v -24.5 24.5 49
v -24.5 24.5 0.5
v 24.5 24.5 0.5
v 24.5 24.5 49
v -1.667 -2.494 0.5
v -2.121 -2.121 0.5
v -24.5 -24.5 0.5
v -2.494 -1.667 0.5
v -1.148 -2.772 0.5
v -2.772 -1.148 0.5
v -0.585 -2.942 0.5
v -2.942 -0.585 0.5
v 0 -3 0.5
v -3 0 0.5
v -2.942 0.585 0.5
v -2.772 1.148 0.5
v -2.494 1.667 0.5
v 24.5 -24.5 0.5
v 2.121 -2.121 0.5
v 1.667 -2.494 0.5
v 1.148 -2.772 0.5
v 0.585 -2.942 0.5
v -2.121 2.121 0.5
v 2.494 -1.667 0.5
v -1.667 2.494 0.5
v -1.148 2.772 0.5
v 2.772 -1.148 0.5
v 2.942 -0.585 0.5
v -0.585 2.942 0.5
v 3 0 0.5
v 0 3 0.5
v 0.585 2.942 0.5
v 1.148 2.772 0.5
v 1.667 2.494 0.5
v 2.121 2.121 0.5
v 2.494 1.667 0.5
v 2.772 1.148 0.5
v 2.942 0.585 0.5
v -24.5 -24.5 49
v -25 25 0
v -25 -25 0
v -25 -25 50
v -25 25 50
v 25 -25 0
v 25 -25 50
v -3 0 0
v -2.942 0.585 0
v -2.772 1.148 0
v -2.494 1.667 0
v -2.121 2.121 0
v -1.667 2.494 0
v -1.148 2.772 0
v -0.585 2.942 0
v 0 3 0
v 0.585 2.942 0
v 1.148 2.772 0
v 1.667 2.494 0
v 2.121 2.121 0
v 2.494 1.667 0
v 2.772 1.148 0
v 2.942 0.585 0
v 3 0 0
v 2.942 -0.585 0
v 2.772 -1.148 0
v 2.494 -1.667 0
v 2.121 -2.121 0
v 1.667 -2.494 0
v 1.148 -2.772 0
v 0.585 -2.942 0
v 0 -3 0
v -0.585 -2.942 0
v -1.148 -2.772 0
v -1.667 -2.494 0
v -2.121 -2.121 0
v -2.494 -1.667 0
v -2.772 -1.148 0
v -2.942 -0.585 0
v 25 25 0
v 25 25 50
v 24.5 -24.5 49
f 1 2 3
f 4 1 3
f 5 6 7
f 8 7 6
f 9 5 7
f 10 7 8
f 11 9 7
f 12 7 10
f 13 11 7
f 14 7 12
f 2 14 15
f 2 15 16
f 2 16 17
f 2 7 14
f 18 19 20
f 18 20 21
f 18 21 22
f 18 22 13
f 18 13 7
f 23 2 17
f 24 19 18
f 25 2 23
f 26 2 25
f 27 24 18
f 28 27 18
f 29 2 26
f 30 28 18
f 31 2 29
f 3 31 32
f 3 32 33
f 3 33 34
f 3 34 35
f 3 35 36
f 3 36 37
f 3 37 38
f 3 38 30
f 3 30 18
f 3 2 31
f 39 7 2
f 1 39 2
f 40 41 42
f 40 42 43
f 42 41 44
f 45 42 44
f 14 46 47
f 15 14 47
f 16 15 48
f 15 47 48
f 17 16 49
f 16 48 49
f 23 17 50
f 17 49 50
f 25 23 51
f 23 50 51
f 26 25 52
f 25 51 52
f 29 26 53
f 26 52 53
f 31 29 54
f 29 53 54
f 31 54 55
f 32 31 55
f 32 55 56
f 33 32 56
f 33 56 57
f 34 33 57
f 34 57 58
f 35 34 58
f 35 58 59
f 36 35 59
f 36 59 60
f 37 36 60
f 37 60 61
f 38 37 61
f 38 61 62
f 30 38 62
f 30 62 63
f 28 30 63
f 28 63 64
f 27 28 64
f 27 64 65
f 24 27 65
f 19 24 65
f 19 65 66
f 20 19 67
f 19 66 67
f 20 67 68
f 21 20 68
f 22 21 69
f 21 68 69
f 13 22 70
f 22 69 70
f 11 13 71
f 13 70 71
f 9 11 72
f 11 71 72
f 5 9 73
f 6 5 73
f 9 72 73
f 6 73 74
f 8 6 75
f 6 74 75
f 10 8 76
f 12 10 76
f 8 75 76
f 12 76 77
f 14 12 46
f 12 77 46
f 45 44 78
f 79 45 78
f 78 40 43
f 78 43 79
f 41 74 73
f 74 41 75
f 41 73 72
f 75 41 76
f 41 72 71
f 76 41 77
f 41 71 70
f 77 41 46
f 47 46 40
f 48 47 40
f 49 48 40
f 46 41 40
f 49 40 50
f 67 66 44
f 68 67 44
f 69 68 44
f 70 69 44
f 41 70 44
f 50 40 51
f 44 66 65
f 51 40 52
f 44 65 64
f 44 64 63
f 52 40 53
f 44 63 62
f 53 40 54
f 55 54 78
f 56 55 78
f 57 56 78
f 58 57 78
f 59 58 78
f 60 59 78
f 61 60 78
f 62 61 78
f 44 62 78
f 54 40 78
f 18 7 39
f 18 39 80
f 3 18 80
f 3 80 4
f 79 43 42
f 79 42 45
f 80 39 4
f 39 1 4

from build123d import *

# Parameters (mm, degrees)
ESQUISSE1_W             = 50
ESQUISSE1_H             = 50
BOSS_EXTRU_1_DEPTH      = 50
COQUE2_T                = -0.5
ESQUISSE2_R             = 3
ENL_V_MAT_EXTRU_1_DEPTH = 5
ESQUISSE3_W             = 50
ESQUISSE3_H             = 50
BOSS_EXTRU_2_DEPTH      = 1


with BuildPart() as part:
    # Esquisse1 → Boss.-Extru.1 (new body)
    with BuildSketch(Plane.XY):
        Rectangle(ESQUISSE1_W, ESQUISSE1_H)
    extrude(amount=BOSS_EXTRU_1_DEPTH)

    # Coque2
    coque2_openings = [part.faces().sort_by_distance(p)[0] for p in [
        (0, 0, 50),
    ]]
    offset(amount=COQUE2_T, openings=coque2_openings, kind=Kind.INTERSECTION)

    # Esquisse2 → Enl_v. mat.-Extru.1 (cut)
    with BuildSketch(Plane(origin=(0, 0, 0), x_dir=(-1, 0, 0), z_dir=(0, 0, -1))):
        Circle(ESQUISSE2_R)
    extrude(amount=-ENL_V_MAT_EXTRU_1_DEPTH, mode=Mode.SUBTRACT)

    # Esquisse3 → Boss.-Extru.2 (add)
    with BuildSketch(Plane.XY.offset(50)):
        Rectangle(ESQUISSE3_W, ESQUISSE3_H)
    extrude(amount=-BOSS_EXTRU_2_DEPTH)


solid = part.part
